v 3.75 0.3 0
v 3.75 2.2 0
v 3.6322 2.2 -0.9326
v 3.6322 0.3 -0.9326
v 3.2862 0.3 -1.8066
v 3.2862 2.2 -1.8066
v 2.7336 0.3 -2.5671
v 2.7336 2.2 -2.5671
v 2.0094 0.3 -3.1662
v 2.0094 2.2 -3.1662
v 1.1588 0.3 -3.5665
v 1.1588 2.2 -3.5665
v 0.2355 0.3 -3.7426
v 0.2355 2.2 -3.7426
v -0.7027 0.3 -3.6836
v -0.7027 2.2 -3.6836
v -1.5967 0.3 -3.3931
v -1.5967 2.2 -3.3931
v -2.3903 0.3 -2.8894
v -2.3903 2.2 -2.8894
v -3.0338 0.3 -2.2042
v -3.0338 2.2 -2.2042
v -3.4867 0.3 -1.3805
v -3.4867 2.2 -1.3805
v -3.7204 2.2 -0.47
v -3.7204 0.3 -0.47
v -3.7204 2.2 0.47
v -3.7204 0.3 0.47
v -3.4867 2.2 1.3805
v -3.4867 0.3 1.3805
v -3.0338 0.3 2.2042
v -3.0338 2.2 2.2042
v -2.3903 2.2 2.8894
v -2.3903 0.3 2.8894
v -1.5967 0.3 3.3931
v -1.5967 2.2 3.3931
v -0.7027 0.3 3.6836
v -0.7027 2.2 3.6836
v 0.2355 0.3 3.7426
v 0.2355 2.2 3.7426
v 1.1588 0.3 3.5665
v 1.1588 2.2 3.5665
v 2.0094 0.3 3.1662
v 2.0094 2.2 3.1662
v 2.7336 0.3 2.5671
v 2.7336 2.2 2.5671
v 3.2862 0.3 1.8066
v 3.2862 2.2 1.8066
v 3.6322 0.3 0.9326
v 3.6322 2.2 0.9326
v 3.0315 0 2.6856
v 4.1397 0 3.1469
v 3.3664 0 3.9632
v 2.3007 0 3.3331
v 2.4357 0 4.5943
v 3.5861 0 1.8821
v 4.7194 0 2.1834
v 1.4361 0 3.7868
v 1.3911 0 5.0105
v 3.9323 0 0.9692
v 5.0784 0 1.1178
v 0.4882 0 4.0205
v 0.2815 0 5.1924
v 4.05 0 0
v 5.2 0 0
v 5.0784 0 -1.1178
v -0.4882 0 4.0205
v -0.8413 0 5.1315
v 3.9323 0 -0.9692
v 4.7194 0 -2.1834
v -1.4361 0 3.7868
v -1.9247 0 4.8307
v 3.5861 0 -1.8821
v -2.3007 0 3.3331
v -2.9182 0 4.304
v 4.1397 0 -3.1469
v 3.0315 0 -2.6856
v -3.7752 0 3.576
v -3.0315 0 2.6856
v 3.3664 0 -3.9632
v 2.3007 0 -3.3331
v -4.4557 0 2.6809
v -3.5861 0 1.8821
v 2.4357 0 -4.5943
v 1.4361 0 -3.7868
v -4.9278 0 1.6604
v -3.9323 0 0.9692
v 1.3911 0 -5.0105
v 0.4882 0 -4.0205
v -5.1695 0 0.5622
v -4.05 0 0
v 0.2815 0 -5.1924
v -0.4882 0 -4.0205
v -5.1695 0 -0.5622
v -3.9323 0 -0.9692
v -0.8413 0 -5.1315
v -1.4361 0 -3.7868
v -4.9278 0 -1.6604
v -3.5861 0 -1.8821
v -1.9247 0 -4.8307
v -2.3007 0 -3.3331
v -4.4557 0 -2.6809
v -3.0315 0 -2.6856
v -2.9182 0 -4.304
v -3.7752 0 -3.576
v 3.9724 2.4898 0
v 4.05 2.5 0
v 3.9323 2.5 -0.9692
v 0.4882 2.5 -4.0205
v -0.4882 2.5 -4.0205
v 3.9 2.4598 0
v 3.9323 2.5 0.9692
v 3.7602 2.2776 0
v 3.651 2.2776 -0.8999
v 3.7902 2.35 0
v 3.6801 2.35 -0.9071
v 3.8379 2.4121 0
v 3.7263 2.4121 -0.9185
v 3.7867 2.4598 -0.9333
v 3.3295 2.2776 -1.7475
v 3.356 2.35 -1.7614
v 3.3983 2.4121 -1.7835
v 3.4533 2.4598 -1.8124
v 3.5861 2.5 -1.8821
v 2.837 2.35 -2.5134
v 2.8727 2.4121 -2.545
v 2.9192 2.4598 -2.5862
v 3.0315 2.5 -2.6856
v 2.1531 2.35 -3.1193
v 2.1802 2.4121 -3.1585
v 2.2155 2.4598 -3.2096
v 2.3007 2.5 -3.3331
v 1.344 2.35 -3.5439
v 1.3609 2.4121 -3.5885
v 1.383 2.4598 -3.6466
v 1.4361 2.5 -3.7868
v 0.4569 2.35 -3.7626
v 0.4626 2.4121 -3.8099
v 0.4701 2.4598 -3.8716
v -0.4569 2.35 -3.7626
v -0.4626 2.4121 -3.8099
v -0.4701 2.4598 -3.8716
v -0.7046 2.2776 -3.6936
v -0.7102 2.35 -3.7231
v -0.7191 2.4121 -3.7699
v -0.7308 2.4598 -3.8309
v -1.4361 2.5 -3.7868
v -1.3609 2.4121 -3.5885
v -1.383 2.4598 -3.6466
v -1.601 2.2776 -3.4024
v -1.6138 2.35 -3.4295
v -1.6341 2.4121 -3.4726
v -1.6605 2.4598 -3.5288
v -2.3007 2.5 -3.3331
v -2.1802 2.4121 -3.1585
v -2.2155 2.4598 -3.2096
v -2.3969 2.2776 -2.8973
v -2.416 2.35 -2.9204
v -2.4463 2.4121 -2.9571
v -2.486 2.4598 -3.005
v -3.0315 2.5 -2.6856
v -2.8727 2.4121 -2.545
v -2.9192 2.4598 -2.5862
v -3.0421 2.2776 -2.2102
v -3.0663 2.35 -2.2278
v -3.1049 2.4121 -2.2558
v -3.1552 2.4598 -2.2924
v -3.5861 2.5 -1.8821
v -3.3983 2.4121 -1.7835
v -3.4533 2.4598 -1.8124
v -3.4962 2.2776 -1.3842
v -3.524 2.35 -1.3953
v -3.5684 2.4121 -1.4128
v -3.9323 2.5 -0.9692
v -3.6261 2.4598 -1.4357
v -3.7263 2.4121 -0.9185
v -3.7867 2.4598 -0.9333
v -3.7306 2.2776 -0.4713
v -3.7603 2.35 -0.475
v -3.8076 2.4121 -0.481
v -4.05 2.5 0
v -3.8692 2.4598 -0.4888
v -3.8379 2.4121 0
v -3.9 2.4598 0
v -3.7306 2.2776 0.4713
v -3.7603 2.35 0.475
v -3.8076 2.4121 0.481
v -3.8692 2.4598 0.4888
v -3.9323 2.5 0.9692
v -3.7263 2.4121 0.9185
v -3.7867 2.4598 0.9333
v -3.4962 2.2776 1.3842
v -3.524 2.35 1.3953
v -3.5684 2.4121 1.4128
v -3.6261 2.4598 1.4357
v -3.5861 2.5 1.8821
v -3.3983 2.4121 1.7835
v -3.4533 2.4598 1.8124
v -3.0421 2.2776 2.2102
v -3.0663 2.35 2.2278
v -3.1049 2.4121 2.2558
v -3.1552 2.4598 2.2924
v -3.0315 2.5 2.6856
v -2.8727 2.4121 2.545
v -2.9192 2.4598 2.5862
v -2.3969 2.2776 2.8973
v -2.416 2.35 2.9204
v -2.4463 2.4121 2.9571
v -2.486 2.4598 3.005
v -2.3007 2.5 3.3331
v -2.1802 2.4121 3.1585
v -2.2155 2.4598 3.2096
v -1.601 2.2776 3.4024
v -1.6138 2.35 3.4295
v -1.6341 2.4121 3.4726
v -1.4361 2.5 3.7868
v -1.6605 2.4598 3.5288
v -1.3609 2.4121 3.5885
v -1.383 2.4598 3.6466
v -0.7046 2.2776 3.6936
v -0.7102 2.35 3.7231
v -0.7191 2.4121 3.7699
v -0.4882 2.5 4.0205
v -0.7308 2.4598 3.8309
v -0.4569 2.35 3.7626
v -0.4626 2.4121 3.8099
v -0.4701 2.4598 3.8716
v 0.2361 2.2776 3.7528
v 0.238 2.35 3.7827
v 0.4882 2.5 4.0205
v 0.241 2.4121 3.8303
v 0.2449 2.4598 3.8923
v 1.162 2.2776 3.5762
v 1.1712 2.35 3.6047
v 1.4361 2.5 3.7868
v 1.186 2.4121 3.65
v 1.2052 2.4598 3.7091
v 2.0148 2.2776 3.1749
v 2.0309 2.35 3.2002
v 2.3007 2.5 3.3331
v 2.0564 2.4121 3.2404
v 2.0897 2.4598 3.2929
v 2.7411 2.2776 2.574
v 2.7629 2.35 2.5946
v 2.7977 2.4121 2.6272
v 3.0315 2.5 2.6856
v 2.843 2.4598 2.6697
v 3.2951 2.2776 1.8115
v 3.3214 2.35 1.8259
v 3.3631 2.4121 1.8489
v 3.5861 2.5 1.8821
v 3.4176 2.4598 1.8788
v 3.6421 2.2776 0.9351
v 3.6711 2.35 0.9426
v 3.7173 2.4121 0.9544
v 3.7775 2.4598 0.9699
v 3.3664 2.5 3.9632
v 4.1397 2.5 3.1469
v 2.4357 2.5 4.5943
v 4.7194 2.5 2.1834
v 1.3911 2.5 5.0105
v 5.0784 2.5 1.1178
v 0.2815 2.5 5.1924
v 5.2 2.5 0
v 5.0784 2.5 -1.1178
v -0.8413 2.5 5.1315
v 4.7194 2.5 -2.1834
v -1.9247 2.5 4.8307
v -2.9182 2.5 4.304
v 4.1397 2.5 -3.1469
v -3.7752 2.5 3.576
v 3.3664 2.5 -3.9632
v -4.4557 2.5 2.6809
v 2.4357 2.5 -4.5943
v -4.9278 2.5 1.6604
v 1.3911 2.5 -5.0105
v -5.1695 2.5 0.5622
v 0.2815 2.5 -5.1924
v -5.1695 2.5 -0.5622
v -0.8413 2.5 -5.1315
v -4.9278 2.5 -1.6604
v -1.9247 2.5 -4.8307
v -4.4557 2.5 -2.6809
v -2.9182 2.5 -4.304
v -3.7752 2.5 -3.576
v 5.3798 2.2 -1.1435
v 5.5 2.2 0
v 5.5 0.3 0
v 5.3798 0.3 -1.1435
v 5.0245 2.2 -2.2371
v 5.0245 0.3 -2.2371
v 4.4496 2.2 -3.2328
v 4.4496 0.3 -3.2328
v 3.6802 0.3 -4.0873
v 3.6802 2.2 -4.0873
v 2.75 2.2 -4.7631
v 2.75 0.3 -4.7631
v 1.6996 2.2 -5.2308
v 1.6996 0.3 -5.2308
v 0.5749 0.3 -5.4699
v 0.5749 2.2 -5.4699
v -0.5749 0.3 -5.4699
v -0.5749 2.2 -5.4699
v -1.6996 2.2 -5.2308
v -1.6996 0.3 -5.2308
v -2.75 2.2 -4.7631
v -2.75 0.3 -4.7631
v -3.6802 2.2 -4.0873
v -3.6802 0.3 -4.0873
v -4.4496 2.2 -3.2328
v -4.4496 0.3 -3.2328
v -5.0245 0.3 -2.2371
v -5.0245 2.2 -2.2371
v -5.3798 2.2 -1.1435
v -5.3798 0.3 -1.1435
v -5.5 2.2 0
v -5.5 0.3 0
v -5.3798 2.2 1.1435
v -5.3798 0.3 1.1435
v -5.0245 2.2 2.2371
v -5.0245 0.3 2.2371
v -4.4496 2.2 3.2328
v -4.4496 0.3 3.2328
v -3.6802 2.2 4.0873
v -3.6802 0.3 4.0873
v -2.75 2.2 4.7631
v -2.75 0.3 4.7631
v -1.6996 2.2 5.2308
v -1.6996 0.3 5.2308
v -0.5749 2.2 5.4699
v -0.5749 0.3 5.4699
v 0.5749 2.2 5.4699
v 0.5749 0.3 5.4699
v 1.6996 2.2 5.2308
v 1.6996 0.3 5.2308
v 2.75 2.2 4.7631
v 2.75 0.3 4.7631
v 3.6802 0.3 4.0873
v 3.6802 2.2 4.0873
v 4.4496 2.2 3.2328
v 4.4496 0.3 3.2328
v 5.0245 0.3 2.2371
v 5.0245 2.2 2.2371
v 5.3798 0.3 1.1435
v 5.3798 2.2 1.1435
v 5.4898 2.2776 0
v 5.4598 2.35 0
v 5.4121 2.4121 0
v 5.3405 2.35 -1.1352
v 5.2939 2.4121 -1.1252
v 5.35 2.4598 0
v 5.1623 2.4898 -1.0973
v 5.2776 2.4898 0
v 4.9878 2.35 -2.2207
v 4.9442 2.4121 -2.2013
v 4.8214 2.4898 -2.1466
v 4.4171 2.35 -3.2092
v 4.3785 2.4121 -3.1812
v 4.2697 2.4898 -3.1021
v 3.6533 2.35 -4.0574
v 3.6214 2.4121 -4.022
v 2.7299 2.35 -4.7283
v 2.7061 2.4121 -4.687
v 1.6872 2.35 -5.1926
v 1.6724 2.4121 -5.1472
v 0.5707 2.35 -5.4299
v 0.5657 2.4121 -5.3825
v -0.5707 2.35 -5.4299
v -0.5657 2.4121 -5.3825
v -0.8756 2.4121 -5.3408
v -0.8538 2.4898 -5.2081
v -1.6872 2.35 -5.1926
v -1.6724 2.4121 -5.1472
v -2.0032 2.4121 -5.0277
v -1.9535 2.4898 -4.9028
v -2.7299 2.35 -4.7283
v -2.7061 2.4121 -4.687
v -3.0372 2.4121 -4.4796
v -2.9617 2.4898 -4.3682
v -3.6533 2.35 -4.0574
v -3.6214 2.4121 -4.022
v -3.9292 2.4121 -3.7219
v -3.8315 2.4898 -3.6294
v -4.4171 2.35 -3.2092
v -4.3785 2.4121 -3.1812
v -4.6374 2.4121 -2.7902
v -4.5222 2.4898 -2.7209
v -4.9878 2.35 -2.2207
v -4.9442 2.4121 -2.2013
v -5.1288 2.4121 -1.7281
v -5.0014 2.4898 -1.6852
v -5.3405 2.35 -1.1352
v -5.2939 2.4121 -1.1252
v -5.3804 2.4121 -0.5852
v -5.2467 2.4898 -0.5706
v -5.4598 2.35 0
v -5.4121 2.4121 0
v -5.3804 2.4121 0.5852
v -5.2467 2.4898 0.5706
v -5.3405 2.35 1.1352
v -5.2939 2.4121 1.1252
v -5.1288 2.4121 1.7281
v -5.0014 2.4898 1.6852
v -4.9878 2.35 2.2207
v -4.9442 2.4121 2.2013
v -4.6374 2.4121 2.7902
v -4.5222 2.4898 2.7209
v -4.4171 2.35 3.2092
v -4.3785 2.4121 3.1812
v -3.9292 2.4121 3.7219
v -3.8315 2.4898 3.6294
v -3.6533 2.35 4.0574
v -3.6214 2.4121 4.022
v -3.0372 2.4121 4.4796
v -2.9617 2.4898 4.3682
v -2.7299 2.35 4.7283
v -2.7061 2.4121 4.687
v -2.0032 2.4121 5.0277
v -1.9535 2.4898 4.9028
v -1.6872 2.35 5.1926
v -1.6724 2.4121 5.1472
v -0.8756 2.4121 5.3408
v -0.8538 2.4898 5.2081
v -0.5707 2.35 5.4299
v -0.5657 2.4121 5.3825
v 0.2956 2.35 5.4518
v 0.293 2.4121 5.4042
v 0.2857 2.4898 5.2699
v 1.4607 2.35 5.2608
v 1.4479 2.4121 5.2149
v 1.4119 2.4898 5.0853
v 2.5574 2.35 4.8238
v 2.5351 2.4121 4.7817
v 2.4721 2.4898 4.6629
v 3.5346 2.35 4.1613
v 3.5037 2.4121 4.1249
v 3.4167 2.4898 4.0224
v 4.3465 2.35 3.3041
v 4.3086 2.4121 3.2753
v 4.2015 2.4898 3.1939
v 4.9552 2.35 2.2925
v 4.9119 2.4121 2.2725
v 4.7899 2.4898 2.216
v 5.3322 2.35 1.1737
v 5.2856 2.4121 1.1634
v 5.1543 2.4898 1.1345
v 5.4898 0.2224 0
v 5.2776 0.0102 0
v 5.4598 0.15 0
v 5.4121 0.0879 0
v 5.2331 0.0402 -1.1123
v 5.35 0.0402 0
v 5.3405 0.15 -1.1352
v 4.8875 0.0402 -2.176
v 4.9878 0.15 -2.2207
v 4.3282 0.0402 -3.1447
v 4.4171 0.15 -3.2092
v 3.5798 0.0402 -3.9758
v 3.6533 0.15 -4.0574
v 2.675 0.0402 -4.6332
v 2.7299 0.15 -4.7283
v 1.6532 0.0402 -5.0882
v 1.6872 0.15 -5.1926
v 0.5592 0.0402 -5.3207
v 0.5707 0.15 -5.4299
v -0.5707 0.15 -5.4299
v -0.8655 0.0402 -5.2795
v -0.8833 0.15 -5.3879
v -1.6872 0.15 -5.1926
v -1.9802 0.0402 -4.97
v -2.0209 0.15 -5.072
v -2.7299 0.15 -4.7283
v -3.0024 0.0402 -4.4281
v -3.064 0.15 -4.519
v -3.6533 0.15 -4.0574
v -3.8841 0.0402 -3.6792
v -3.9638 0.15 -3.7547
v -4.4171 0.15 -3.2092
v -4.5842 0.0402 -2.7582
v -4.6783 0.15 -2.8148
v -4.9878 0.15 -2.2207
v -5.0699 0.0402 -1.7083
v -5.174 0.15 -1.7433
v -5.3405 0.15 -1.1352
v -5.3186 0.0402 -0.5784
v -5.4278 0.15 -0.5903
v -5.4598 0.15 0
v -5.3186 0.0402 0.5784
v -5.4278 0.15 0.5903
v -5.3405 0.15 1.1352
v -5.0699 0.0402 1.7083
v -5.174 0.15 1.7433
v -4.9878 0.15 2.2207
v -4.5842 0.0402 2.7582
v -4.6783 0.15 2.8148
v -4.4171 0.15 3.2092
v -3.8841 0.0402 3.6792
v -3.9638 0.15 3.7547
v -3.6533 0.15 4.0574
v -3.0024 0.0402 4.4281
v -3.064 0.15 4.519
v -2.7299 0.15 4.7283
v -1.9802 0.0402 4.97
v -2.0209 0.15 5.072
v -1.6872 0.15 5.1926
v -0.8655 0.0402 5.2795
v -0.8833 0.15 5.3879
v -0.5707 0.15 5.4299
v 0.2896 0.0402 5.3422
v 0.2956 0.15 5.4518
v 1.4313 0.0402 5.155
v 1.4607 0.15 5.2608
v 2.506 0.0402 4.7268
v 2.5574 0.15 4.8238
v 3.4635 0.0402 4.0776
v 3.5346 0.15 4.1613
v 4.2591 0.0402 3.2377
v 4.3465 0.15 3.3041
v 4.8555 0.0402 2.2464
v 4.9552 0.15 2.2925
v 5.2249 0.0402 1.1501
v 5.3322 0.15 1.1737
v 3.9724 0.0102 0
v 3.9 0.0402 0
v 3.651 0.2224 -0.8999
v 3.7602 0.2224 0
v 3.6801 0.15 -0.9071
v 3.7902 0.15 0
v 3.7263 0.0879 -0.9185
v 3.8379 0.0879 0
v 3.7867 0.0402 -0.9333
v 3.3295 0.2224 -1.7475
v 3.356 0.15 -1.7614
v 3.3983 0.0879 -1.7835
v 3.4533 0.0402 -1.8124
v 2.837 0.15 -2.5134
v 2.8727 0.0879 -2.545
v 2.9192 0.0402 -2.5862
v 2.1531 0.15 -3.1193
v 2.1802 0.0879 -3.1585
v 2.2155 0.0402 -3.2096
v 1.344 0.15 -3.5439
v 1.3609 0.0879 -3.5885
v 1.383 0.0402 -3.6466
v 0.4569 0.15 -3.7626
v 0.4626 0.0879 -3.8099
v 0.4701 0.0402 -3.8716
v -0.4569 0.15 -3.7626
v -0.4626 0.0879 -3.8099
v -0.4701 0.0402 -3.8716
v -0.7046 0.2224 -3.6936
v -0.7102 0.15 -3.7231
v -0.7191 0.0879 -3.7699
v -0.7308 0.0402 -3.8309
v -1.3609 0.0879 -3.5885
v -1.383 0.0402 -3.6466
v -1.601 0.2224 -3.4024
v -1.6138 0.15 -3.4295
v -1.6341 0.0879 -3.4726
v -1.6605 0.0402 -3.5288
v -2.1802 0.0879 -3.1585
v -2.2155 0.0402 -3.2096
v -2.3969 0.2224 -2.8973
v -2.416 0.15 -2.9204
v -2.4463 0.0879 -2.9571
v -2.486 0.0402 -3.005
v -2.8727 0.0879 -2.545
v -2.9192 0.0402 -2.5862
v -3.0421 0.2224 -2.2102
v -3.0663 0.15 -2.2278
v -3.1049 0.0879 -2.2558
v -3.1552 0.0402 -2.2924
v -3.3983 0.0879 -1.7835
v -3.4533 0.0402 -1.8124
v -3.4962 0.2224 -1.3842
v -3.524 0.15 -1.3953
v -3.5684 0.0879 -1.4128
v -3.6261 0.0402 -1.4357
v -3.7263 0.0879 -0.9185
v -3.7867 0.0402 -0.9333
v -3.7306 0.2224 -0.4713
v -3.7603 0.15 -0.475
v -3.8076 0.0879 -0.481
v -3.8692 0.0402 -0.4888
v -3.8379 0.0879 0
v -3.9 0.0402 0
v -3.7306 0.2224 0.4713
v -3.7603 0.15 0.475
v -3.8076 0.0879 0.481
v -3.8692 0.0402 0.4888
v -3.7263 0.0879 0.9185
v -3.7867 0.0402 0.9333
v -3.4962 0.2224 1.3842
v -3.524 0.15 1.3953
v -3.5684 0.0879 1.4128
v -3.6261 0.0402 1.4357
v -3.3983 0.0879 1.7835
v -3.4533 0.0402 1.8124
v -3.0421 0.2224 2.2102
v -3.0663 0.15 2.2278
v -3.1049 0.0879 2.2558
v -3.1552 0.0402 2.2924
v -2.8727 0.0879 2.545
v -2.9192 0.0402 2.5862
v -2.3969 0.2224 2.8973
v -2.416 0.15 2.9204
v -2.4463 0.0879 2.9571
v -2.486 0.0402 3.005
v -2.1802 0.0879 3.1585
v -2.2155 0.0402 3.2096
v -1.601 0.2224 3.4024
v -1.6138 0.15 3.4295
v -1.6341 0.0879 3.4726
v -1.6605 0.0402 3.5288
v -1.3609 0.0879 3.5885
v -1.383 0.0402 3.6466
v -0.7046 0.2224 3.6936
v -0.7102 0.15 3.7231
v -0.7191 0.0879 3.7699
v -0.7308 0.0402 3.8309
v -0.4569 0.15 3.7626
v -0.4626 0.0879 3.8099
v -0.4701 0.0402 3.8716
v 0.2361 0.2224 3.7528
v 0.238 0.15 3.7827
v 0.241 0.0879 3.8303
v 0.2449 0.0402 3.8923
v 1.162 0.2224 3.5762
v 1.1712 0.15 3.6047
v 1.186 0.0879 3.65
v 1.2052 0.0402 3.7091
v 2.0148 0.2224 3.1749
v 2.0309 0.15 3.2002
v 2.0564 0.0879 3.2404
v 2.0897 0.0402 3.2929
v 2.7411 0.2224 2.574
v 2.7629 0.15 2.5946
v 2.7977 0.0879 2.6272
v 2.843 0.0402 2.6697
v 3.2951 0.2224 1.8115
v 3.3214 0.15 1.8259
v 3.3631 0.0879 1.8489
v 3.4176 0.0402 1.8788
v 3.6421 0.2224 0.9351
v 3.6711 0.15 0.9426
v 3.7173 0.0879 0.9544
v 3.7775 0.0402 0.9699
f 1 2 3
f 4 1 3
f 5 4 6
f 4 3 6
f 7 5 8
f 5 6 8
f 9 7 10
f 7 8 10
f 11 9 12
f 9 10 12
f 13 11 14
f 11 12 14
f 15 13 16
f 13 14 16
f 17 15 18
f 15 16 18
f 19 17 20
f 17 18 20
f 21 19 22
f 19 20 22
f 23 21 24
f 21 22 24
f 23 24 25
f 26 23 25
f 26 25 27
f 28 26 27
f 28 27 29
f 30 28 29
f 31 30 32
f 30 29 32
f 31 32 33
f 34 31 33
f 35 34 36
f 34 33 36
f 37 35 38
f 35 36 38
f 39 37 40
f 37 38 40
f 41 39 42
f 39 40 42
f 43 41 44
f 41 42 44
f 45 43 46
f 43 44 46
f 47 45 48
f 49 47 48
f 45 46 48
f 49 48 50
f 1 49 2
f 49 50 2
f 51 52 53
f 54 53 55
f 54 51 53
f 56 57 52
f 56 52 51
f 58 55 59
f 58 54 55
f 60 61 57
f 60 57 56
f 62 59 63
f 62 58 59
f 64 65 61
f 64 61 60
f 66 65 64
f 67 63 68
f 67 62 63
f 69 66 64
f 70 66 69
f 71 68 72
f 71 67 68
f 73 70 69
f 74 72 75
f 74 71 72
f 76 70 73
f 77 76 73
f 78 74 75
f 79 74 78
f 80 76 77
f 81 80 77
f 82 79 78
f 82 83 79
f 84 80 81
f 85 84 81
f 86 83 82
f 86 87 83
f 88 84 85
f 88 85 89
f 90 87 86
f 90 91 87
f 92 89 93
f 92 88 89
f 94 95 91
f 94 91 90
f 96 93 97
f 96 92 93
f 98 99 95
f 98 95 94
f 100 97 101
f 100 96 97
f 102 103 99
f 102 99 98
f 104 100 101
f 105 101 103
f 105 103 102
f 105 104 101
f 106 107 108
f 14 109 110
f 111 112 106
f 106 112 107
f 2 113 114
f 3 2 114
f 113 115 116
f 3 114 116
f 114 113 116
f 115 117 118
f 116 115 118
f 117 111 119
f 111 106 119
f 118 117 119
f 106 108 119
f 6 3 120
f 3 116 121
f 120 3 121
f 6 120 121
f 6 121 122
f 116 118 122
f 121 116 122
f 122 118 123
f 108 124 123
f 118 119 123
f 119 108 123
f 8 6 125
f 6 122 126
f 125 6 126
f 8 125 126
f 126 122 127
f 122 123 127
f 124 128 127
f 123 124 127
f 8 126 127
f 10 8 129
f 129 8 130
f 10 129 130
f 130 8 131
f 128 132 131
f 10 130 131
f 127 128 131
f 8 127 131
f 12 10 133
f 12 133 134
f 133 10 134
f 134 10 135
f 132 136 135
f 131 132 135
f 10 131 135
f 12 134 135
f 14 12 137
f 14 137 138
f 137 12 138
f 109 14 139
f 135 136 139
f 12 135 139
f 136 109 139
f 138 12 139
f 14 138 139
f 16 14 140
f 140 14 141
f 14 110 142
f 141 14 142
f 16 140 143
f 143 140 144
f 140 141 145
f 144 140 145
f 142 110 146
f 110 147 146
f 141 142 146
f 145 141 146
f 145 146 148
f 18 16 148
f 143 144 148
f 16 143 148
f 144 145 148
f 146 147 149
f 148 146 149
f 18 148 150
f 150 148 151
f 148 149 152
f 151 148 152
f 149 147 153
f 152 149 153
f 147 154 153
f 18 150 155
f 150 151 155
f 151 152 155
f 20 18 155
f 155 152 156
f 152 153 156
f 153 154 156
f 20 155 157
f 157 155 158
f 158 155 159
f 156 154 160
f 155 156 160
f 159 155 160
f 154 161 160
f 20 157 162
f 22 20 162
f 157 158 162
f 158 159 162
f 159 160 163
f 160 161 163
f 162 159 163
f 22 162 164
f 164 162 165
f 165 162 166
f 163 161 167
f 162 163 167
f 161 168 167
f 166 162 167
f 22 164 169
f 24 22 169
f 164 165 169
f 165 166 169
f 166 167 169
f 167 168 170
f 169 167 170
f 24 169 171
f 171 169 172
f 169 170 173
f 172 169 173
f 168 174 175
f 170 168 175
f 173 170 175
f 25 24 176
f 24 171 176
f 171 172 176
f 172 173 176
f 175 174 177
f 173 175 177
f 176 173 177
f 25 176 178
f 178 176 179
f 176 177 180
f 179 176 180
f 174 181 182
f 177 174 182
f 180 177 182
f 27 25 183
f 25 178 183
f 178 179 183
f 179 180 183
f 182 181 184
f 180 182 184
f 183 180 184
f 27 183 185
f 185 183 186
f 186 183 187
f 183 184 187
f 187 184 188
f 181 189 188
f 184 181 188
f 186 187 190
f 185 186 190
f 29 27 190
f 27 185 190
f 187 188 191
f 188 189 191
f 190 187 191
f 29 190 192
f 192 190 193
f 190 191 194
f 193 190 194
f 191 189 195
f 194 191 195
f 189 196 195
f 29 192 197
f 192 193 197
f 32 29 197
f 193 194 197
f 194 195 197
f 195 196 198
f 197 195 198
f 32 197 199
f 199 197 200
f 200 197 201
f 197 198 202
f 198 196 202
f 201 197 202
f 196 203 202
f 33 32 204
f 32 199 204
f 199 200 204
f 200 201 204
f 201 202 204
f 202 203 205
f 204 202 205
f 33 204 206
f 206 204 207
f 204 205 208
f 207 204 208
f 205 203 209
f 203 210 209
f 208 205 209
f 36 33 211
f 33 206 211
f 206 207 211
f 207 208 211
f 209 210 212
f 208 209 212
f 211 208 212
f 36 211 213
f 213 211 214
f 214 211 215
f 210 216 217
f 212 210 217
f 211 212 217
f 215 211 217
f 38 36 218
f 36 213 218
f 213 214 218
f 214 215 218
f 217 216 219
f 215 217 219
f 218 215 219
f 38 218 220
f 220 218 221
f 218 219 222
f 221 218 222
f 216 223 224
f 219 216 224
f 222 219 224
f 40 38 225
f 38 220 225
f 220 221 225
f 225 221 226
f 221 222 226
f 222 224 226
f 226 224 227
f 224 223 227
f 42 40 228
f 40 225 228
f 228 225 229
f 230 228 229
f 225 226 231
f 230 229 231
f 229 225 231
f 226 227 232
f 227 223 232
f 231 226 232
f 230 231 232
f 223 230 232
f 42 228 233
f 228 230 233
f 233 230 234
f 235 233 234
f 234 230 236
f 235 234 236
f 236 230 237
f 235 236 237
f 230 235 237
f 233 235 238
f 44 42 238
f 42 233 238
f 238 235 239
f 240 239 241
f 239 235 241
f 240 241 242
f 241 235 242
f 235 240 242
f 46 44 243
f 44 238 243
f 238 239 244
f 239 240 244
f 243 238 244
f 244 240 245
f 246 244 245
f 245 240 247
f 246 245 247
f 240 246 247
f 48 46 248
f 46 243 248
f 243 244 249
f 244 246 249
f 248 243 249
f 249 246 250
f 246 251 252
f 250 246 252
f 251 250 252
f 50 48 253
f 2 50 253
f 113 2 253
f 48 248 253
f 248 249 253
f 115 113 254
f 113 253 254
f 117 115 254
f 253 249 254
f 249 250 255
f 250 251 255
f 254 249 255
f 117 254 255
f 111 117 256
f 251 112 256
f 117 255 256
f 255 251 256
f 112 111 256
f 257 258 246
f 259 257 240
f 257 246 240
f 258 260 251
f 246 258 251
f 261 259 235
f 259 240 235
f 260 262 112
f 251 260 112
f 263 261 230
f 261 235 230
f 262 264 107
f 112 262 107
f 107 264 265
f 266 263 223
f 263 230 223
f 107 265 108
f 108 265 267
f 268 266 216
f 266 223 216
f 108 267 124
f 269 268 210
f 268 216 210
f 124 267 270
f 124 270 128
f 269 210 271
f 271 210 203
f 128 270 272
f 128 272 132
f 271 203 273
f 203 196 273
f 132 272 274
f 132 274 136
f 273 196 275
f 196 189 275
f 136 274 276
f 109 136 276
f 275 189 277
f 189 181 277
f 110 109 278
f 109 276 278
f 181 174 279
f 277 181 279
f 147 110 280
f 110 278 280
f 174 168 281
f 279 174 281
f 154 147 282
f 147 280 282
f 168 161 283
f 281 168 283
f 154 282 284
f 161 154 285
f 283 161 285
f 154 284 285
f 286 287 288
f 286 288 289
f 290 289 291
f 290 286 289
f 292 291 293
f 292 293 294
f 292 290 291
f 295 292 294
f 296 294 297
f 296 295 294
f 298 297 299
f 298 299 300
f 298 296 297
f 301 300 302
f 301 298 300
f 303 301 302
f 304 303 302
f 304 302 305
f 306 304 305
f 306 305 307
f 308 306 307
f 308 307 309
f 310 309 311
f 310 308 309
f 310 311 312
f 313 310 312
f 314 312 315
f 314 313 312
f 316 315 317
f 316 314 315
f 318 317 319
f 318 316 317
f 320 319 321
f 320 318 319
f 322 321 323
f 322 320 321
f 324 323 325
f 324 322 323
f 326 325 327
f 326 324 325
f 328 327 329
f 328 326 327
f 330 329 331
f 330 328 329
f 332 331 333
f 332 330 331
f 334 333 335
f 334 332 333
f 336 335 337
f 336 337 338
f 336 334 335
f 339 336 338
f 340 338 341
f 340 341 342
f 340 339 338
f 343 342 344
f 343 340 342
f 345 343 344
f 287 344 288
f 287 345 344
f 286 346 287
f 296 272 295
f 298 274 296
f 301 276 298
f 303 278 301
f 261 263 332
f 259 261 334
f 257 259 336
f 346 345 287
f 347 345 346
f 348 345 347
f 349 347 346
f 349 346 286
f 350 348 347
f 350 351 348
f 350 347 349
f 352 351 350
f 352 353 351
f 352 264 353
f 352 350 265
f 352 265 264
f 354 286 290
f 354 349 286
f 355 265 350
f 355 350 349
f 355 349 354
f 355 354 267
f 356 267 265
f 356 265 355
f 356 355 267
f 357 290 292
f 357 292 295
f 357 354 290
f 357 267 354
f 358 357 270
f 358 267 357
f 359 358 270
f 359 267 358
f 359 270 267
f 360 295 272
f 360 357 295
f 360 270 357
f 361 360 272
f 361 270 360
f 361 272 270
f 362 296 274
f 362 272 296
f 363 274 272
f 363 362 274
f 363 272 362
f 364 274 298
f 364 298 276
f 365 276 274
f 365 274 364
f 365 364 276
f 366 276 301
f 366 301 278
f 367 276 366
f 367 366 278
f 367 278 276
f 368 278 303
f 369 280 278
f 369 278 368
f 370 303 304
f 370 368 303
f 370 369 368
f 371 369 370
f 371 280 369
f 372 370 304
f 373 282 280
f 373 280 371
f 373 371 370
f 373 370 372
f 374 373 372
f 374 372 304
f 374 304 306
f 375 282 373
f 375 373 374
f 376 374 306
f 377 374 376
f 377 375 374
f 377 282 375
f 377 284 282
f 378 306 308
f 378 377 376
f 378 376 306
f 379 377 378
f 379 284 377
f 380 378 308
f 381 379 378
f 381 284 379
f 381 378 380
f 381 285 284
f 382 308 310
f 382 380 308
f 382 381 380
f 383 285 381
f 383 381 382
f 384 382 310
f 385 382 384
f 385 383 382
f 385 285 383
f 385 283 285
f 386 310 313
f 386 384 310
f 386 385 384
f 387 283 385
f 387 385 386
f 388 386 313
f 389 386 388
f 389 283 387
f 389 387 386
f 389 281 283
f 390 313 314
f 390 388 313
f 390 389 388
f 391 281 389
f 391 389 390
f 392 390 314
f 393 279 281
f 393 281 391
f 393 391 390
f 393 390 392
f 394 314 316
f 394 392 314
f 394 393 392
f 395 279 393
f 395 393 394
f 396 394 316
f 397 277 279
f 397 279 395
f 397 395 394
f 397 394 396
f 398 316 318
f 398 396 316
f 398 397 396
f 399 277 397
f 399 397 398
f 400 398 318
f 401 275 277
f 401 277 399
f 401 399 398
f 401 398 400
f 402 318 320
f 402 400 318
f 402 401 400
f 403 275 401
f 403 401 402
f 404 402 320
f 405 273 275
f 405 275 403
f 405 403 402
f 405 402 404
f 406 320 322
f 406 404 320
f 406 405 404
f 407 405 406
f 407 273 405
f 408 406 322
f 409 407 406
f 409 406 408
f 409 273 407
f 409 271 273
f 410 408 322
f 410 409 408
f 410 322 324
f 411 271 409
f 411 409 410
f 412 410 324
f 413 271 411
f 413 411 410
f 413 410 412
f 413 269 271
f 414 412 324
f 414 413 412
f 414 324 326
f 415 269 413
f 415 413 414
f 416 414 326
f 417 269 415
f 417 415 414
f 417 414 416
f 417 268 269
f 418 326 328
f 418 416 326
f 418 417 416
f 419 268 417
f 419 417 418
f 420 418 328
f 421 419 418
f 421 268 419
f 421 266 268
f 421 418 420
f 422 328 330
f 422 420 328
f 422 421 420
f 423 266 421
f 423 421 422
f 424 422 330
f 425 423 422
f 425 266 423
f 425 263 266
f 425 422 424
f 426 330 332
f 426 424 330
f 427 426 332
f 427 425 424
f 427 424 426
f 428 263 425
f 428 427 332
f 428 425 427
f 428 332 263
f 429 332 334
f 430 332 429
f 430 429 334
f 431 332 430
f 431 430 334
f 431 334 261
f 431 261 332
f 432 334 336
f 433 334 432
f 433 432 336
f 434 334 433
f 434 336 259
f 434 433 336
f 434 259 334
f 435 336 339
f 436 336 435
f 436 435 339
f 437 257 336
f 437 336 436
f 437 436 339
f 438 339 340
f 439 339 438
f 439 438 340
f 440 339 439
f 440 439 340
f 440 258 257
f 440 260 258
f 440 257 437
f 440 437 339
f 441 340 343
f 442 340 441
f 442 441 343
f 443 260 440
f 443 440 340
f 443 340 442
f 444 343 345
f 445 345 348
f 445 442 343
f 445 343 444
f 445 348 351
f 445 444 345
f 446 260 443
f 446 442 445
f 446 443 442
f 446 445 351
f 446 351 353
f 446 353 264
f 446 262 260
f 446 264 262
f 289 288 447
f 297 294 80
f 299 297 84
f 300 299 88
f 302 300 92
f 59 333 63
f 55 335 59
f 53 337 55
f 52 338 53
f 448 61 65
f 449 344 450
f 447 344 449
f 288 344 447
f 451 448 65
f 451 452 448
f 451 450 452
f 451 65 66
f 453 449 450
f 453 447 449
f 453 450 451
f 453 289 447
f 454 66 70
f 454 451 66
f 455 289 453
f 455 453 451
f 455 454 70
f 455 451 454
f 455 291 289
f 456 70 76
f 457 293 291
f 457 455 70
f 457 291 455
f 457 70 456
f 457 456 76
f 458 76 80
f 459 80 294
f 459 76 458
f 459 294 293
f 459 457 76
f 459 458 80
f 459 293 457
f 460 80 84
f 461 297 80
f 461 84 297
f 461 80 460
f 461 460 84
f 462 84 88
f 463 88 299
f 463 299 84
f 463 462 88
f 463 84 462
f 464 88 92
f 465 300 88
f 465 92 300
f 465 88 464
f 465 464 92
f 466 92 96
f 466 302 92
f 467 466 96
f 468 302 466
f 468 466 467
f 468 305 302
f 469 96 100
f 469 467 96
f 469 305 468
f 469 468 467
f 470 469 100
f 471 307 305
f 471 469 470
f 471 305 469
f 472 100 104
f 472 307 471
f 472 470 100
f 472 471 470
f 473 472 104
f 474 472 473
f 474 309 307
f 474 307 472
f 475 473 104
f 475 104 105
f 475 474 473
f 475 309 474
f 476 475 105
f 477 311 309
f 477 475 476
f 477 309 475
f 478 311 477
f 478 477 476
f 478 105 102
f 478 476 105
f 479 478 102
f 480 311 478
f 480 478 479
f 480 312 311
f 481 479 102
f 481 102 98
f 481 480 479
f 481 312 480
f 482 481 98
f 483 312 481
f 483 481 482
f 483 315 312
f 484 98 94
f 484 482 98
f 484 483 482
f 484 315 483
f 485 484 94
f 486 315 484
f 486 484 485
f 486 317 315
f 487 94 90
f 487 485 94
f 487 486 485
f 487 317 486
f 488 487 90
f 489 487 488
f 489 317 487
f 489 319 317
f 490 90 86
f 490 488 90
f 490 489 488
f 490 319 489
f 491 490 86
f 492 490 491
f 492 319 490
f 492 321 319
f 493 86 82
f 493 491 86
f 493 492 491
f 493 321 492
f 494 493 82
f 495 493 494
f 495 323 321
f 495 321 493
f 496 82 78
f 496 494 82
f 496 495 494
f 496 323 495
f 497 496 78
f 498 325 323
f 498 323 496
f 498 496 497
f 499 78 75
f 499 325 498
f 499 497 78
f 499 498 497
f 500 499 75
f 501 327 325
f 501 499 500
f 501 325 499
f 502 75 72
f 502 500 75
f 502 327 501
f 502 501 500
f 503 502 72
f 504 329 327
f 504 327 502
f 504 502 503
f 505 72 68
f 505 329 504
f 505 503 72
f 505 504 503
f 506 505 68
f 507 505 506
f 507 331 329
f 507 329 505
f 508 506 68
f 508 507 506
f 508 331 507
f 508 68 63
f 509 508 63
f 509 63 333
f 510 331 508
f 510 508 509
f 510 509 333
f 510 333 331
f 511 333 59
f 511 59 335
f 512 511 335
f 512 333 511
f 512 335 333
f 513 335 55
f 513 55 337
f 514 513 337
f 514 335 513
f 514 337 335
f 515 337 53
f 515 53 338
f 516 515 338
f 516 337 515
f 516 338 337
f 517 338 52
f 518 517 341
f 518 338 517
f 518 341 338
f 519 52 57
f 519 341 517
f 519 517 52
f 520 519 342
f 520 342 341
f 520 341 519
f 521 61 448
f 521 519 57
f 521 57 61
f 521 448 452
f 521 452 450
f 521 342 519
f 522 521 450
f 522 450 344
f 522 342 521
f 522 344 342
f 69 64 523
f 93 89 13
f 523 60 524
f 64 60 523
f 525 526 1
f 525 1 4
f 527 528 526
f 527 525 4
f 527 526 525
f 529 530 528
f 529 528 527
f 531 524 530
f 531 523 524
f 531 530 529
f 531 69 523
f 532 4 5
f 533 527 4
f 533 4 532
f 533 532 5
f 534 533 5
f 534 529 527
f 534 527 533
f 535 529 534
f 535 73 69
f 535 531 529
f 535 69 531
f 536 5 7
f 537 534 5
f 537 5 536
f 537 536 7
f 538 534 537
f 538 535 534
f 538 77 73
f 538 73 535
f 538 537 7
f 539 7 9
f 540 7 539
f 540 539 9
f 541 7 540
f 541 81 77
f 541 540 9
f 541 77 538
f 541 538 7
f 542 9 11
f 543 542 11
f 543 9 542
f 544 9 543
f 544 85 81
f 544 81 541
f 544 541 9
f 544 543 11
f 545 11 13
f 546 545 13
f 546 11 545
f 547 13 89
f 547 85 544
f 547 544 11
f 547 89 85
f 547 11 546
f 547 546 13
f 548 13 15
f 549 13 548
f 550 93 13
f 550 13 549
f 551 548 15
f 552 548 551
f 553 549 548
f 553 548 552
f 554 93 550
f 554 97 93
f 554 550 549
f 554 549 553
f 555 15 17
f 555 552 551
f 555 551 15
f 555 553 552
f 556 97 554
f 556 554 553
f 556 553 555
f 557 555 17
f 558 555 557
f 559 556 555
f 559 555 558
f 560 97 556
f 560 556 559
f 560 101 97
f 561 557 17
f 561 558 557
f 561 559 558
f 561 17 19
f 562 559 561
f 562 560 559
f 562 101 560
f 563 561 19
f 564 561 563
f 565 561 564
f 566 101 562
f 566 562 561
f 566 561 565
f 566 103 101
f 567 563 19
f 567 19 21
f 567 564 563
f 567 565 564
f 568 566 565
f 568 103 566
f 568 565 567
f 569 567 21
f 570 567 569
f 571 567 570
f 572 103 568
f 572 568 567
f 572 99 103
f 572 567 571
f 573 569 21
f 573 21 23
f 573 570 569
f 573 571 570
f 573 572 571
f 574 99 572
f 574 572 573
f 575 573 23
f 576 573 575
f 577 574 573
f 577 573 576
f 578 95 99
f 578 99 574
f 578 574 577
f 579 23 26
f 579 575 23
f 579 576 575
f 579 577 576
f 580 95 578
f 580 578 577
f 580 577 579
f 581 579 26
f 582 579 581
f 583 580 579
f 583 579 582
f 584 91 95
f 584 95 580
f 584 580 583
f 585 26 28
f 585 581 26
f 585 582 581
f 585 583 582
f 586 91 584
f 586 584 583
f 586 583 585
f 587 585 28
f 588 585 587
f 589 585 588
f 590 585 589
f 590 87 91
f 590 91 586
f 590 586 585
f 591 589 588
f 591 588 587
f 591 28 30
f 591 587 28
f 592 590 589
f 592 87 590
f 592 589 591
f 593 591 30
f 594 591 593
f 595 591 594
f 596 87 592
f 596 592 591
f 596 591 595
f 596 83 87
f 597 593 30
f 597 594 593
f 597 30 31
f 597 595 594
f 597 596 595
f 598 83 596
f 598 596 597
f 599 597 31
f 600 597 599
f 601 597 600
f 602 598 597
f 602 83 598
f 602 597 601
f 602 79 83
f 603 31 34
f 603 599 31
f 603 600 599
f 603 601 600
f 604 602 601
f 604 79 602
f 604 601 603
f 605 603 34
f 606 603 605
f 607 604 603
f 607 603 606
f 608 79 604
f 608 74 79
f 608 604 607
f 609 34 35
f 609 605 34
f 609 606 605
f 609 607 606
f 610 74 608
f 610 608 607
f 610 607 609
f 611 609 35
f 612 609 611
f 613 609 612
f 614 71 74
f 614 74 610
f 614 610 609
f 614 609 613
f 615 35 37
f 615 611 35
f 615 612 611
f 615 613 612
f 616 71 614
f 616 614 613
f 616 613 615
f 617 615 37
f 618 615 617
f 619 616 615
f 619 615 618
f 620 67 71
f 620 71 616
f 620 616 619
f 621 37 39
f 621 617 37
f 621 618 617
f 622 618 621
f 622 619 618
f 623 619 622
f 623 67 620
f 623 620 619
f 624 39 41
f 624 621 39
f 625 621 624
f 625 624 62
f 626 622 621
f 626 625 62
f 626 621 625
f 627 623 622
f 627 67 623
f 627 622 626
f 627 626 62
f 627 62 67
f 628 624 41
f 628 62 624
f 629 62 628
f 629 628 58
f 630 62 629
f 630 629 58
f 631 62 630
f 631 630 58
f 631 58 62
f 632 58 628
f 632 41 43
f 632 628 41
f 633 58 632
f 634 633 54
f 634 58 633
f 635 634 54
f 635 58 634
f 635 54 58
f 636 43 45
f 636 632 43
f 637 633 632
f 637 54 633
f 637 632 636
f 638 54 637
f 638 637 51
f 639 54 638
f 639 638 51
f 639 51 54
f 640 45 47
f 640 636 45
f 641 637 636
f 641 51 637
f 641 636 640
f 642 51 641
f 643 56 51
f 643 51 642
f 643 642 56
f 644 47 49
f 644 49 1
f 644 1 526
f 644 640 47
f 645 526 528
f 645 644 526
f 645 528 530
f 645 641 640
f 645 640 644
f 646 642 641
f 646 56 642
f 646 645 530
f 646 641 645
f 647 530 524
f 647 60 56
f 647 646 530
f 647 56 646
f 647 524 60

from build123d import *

# Parameters (mm, degrees)
SKETCH_1_W = 1.75
SKETCH_1_H = 2.5
FILLET_1_R = 0.3


with BuildPart() as part:
    # Эскиз1 → Повернуть1 (revolve)
    with BuildSketch(Plane.XY):
        with Locations((4.625, 1.25)):
            Rectangle(SKETCH_1_W, SKETCH_1_H)
    revolve(axis=Axis((0, 0, 0), (0, 1, 0)))

    # Скругление1
    fillet_1_edges = [part.edges().sort_by_distance(p)[0] for p in [
        (-5.5, 0, 0),
        (-5.5, 2.5, 0),
        (-3.75, 2.5, 0),
        (-3.75, 0, 0),
    ]]
    fillet(fillet_1_edges, radius=FILLET_1_R)


solid = part.part
